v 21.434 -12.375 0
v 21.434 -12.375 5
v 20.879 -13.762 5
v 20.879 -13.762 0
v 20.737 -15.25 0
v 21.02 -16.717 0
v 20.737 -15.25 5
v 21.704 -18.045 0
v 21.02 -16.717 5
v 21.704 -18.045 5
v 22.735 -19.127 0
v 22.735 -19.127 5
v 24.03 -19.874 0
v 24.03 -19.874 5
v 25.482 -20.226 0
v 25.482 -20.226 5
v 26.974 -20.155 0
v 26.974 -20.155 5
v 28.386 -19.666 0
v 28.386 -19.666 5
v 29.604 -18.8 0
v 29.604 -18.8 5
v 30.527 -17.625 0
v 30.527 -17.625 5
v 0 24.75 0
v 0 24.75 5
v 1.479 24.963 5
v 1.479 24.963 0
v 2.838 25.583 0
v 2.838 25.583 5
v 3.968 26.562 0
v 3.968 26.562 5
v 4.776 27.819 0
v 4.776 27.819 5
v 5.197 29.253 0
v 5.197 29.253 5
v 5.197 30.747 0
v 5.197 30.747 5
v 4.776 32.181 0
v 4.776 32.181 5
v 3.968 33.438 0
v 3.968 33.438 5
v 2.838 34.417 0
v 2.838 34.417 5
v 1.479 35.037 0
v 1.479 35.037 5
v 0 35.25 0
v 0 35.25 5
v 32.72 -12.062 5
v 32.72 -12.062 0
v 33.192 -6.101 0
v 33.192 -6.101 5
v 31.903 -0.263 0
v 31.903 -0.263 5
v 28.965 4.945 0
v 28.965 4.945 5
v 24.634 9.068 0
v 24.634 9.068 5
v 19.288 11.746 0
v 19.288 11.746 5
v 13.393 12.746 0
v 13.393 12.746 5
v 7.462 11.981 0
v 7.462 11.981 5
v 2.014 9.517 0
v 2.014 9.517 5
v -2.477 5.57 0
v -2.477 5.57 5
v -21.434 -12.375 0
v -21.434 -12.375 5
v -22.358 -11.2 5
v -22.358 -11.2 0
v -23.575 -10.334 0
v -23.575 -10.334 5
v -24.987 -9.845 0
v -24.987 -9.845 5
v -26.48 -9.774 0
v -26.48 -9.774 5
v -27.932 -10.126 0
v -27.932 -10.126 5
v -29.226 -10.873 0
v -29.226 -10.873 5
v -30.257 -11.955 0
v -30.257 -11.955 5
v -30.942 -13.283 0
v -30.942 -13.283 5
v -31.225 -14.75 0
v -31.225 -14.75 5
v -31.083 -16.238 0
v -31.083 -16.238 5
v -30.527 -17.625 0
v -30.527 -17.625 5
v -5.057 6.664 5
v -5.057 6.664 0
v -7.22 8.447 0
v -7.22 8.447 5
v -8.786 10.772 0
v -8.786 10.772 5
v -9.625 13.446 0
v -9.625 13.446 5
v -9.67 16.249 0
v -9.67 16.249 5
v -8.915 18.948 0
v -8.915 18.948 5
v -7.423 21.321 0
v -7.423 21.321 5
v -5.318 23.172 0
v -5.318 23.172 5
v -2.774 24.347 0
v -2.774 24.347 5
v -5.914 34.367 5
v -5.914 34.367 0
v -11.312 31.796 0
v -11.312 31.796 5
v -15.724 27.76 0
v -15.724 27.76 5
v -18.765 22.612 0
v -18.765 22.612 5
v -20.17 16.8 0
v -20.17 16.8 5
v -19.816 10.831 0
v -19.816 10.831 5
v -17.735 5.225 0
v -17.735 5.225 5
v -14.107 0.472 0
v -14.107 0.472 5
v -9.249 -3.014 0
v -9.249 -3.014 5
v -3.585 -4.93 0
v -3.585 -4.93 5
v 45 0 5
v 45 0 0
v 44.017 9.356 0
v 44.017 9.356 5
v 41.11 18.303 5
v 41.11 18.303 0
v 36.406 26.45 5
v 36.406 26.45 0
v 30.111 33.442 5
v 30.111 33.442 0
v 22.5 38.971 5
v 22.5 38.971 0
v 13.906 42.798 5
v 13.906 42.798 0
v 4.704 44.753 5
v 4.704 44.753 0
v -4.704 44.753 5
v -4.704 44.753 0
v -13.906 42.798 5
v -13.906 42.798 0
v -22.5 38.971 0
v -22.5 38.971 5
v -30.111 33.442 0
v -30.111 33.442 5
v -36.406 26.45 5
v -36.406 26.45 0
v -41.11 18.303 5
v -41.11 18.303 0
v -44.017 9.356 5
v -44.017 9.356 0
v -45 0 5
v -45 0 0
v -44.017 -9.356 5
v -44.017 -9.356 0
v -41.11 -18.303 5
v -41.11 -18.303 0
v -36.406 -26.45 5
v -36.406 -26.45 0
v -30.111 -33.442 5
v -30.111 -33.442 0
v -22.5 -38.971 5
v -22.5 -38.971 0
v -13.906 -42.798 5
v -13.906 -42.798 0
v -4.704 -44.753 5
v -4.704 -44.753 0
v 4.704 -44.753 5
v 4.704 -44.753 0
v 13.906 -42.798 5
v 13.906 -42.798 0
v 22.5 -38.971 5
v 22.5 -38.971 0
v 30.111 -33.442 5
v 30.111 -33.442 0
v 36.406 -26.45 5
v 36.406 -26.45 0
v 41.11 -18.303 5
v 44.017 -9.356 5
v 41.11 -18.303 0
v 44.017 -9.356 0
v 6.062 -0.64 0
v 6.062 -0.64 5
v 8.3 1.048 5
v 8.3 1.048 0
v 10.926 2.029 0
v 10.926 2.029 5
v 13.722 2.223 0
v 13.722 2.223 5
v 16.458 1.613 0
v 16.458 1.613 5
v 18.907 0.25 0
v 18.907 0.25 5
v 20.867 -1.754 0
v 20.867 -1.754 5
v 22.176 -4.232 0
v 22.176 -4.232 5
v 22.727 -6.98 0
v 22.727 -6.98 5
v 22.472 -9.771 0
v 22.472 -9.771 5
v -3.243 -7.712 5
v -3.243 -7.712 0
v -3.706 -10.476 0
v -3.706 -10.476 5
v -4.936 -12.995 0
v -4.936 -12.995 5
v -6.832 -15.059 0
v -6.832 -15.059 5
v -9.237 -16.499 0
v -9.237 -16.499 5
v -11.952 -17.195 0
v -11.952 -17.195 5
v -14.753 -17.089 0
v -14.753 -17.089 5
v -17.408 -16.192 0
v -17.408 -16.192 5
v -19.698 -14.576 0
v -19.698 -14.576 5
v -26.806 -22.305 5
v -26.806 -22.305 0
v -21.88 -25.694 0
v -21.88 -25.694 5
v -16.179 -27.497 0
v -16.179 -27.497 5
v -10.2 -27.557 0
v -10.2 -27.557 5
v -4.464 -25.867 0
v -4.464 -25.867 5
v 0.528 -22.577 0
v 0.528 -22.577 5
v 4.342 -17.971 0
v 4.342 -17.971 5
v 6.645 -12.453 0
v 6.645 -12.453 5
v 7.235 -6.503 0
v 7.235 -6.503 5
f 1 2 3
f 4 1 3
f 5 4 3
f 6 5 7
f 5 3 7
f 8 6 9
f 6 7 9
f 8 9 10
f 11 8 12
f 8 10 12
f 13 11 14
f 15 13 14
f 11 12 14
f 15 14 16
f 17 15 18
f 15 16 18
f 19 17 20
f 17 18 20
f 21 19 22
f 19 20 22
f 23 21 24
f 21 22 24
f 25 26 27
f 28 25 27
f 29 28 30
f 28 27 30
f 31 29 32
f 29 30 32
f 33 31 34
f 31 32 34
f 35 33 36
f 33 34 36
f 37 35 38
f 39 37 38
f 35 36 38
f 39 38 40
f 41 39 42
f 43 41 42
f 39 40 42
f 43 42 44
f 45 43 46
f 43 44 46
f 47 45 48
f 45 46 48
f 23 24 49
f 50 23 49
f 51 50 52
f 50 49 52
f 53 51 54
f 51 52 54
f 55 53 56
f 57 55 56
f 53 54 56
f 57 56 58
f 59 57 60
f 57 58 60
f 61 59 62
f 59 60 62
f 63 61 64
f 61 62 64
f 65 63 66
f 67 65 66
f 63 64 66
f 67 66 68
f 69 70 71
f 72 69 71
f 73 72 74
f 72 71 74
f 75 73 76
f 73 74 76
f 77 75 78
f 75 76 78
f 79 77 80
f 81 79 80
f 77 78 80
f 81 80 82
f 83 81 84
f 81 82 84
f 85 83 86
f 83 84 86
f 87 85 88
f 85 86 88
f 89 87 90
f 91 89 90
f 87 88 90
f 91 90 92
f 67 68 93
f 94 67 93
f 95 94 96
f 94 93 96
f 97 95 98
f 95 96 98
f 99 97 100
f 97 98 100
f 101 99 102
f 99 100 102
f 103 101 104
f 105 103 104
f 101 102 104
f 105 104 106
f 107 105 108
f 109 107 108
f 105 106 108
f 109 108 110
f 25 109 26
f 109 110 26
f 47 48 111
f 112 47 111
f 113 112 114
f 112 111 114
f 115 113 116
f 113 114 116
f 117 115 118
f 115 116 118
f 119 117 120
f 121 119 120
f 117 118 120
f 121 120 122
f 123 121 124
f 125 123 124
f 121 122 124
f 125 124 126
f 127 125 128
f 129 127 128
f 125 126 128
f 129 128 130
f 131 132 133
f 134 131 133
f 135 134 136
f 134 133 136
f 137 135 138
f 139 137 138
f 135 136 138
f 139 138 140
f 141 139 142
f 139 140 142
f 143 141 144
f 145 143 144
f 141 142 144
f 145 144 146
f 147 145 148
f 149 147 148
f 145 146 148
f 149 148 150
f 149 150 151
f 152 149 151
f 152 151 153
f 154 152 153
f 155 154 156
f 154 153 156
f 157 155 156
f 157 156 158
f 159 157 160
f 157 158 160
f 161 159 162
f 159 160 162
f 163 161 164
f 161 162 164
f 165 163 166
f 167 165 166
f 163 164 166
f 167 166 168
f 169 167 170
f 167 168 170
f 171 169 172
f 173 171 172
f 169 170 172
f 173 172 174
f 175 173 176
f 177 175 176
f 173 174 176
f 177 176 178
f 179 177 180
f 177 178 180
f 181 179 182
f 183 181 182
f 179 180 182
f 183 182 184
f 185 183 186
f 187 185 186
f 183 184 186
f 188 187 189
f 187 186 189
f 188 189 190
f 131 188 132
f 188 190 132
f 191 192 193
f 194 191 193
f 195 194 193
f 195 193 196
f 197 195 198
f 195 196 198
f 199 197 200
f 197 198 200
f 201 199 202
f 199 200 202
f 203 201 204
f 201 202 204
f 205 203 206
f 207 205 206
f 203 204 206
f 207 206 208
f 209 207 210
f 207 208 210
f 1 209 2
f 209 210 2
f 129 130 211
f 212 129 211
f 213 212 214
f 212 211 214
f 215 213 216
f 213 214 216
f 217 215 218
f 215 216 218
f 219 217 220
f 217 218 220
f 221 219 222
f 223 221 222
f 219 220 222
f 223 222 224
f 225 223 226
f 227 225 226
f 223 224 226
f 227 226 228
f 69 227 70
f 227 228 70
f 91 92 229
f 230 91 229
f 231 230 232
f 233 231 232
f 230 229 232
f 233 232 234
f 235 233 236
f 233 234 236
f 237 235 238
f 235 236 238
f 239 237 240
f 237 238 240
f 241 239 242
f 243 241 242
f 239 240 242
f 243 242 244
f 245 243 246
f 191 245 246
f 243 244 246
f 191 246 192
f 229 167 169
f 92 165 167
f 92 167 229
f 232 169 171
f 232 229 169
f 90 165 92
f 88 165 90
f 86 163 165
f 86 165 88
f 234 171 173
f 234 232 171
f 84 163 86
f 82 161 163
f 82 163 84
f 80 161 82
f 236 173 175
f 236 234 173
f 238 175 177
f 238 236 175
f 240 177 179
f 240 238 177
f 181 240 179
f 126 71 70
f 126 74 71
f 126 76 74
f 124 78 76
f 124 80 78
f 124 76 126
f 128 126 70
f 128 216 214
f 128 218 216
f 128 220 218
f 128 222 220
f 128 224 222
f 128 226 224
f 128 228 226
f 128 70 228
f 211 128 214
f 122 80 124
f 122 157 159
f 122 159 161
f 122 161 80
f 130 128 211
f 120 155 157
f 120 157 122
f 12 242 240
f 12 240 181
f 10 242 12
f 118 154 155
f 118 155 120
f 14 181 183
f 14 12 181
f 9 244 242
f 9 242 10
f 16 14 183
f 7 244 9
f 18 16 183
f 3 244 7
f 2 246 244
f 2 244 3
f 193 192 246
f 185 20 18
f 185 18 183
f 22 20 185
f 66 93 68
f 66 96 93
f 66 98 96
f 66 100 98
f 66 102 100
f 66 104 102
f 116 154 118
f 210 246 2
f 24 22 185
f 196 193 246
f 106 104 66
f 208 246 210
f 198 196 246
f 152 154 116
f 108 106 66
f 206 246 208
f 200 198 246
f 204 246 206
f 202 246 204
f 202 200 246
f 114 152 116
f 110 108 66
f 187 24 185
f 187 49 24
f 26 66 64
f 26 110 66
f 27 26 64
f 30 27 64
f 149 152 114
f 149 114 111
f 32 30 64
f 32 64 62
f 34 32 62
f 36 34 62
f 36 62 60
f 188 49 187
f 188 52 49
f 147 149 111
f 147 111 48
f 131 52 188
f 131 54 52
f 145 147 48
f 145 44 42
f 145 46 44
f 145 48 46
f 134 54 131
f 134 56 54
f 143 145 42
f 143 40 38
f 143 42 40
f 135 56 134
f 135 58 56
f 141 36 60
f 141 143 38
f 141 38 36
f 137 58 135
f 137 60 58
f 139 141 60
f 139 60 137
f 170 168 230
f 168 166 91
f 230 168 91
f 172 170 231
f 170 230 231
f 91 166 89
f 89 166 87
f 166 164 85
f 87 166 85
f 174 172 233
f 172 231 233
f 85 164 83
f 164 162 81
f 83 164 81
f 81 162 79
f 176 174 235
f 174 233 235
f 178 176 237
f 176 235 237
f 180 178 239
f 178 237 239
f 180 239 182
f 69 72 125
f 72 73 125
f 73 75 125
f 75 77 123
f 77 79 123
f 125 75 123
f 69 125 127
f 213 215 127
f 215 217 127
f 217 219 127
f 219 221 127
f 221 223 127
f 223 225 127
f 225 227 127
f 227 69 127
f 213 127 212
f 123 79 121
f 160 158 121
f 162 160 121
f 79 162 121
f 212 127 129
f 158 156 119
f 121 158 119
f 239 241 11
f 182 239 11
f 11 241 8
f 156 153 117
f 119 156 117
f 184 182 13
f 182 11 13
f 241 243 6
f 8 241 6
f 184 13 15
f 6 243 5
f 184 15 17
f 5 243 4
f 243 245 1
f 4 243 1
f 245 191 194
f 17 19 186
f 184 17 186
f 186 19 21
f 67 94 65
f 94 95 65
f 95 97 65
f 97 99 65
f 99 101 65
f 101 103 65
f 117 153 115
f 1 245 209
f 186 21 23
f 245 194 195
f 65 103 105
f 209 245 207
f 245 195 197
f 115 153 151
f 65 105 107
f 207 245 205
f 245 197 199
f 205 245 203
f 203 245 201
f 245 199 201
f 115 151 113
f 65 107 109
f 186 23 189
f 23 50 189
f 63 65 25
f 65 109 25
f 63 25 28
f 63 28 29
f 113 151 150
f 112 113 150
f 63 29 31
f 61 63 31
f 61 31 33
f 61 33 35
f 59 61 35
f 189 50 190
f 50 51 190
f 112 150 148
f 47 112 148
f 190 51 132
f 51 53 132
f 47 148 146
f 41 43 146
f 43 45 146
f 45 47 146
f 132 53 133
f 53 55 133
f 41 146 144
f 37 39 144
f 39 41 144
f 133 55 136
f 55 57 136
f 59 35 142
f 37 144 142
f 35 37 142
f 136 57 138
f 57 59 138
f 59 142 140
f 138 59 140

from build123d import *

# Parameters (mm, degrees)
CROQUIS1_R            = 45
DISCO_DEPTH           = 5
CORTAR_EXTRUIR6_DEPTH = 5


with BuildPart() as part:
    # Croquis1 → Disco (new body)
    with BuildSketch(Plane.XY):
        Circle(CROQUIS1_R)
    extrude(amount=DISCO_DEPTH)

    # Croquis6 → Cortar-Extruir6 (cut)
    with BuildSketch(Plane.XY.offset(5)):
        with BuildLine():
            ThreePointArc((-30.527395483, -17.625), (-4.464035413, -25.86746934), (6.062177826, -0.639788633))
            ThreePointArc((6.062177826, -0.639788633), (18.906715666, 0.249805468), (21.434128744, -12.375))
            ThreePointArc((21.434128744, -12.375), (23.355762114, -19.54663337), (30.527395483, -17.625))
            ThreePointArc((30.527395483, -17.625), (24.633903286, 9.067766599), (-2.477015704, 5.569894316))
            ThreePointArc((-2.477015704, 5.569894316), (-9.669695714, 16.248793335), (0, 24.75))
            ThreePointArc((0, 24.75), (5.25, 30), (0, 35.25))
            ThreePointArc((0, 35.25), (-20.169867874, 16.799702741), (-3.585162122, -4.930105684))
            ThreePointArc((-3.585162122, -4.930105684), (-9.237019952, -16.498598803), (-21.434128744, -12.375))
            ThreePointArc((-21.434128744, -12.375), (-28.605762114, -10.45336663), (-30.527395483, -17.625))
        make_face()
    extrude(amount=-CORTAR_EXTRUIR6_DEPTH, mode=Mode.SUBTRACT)


solid = part.part
